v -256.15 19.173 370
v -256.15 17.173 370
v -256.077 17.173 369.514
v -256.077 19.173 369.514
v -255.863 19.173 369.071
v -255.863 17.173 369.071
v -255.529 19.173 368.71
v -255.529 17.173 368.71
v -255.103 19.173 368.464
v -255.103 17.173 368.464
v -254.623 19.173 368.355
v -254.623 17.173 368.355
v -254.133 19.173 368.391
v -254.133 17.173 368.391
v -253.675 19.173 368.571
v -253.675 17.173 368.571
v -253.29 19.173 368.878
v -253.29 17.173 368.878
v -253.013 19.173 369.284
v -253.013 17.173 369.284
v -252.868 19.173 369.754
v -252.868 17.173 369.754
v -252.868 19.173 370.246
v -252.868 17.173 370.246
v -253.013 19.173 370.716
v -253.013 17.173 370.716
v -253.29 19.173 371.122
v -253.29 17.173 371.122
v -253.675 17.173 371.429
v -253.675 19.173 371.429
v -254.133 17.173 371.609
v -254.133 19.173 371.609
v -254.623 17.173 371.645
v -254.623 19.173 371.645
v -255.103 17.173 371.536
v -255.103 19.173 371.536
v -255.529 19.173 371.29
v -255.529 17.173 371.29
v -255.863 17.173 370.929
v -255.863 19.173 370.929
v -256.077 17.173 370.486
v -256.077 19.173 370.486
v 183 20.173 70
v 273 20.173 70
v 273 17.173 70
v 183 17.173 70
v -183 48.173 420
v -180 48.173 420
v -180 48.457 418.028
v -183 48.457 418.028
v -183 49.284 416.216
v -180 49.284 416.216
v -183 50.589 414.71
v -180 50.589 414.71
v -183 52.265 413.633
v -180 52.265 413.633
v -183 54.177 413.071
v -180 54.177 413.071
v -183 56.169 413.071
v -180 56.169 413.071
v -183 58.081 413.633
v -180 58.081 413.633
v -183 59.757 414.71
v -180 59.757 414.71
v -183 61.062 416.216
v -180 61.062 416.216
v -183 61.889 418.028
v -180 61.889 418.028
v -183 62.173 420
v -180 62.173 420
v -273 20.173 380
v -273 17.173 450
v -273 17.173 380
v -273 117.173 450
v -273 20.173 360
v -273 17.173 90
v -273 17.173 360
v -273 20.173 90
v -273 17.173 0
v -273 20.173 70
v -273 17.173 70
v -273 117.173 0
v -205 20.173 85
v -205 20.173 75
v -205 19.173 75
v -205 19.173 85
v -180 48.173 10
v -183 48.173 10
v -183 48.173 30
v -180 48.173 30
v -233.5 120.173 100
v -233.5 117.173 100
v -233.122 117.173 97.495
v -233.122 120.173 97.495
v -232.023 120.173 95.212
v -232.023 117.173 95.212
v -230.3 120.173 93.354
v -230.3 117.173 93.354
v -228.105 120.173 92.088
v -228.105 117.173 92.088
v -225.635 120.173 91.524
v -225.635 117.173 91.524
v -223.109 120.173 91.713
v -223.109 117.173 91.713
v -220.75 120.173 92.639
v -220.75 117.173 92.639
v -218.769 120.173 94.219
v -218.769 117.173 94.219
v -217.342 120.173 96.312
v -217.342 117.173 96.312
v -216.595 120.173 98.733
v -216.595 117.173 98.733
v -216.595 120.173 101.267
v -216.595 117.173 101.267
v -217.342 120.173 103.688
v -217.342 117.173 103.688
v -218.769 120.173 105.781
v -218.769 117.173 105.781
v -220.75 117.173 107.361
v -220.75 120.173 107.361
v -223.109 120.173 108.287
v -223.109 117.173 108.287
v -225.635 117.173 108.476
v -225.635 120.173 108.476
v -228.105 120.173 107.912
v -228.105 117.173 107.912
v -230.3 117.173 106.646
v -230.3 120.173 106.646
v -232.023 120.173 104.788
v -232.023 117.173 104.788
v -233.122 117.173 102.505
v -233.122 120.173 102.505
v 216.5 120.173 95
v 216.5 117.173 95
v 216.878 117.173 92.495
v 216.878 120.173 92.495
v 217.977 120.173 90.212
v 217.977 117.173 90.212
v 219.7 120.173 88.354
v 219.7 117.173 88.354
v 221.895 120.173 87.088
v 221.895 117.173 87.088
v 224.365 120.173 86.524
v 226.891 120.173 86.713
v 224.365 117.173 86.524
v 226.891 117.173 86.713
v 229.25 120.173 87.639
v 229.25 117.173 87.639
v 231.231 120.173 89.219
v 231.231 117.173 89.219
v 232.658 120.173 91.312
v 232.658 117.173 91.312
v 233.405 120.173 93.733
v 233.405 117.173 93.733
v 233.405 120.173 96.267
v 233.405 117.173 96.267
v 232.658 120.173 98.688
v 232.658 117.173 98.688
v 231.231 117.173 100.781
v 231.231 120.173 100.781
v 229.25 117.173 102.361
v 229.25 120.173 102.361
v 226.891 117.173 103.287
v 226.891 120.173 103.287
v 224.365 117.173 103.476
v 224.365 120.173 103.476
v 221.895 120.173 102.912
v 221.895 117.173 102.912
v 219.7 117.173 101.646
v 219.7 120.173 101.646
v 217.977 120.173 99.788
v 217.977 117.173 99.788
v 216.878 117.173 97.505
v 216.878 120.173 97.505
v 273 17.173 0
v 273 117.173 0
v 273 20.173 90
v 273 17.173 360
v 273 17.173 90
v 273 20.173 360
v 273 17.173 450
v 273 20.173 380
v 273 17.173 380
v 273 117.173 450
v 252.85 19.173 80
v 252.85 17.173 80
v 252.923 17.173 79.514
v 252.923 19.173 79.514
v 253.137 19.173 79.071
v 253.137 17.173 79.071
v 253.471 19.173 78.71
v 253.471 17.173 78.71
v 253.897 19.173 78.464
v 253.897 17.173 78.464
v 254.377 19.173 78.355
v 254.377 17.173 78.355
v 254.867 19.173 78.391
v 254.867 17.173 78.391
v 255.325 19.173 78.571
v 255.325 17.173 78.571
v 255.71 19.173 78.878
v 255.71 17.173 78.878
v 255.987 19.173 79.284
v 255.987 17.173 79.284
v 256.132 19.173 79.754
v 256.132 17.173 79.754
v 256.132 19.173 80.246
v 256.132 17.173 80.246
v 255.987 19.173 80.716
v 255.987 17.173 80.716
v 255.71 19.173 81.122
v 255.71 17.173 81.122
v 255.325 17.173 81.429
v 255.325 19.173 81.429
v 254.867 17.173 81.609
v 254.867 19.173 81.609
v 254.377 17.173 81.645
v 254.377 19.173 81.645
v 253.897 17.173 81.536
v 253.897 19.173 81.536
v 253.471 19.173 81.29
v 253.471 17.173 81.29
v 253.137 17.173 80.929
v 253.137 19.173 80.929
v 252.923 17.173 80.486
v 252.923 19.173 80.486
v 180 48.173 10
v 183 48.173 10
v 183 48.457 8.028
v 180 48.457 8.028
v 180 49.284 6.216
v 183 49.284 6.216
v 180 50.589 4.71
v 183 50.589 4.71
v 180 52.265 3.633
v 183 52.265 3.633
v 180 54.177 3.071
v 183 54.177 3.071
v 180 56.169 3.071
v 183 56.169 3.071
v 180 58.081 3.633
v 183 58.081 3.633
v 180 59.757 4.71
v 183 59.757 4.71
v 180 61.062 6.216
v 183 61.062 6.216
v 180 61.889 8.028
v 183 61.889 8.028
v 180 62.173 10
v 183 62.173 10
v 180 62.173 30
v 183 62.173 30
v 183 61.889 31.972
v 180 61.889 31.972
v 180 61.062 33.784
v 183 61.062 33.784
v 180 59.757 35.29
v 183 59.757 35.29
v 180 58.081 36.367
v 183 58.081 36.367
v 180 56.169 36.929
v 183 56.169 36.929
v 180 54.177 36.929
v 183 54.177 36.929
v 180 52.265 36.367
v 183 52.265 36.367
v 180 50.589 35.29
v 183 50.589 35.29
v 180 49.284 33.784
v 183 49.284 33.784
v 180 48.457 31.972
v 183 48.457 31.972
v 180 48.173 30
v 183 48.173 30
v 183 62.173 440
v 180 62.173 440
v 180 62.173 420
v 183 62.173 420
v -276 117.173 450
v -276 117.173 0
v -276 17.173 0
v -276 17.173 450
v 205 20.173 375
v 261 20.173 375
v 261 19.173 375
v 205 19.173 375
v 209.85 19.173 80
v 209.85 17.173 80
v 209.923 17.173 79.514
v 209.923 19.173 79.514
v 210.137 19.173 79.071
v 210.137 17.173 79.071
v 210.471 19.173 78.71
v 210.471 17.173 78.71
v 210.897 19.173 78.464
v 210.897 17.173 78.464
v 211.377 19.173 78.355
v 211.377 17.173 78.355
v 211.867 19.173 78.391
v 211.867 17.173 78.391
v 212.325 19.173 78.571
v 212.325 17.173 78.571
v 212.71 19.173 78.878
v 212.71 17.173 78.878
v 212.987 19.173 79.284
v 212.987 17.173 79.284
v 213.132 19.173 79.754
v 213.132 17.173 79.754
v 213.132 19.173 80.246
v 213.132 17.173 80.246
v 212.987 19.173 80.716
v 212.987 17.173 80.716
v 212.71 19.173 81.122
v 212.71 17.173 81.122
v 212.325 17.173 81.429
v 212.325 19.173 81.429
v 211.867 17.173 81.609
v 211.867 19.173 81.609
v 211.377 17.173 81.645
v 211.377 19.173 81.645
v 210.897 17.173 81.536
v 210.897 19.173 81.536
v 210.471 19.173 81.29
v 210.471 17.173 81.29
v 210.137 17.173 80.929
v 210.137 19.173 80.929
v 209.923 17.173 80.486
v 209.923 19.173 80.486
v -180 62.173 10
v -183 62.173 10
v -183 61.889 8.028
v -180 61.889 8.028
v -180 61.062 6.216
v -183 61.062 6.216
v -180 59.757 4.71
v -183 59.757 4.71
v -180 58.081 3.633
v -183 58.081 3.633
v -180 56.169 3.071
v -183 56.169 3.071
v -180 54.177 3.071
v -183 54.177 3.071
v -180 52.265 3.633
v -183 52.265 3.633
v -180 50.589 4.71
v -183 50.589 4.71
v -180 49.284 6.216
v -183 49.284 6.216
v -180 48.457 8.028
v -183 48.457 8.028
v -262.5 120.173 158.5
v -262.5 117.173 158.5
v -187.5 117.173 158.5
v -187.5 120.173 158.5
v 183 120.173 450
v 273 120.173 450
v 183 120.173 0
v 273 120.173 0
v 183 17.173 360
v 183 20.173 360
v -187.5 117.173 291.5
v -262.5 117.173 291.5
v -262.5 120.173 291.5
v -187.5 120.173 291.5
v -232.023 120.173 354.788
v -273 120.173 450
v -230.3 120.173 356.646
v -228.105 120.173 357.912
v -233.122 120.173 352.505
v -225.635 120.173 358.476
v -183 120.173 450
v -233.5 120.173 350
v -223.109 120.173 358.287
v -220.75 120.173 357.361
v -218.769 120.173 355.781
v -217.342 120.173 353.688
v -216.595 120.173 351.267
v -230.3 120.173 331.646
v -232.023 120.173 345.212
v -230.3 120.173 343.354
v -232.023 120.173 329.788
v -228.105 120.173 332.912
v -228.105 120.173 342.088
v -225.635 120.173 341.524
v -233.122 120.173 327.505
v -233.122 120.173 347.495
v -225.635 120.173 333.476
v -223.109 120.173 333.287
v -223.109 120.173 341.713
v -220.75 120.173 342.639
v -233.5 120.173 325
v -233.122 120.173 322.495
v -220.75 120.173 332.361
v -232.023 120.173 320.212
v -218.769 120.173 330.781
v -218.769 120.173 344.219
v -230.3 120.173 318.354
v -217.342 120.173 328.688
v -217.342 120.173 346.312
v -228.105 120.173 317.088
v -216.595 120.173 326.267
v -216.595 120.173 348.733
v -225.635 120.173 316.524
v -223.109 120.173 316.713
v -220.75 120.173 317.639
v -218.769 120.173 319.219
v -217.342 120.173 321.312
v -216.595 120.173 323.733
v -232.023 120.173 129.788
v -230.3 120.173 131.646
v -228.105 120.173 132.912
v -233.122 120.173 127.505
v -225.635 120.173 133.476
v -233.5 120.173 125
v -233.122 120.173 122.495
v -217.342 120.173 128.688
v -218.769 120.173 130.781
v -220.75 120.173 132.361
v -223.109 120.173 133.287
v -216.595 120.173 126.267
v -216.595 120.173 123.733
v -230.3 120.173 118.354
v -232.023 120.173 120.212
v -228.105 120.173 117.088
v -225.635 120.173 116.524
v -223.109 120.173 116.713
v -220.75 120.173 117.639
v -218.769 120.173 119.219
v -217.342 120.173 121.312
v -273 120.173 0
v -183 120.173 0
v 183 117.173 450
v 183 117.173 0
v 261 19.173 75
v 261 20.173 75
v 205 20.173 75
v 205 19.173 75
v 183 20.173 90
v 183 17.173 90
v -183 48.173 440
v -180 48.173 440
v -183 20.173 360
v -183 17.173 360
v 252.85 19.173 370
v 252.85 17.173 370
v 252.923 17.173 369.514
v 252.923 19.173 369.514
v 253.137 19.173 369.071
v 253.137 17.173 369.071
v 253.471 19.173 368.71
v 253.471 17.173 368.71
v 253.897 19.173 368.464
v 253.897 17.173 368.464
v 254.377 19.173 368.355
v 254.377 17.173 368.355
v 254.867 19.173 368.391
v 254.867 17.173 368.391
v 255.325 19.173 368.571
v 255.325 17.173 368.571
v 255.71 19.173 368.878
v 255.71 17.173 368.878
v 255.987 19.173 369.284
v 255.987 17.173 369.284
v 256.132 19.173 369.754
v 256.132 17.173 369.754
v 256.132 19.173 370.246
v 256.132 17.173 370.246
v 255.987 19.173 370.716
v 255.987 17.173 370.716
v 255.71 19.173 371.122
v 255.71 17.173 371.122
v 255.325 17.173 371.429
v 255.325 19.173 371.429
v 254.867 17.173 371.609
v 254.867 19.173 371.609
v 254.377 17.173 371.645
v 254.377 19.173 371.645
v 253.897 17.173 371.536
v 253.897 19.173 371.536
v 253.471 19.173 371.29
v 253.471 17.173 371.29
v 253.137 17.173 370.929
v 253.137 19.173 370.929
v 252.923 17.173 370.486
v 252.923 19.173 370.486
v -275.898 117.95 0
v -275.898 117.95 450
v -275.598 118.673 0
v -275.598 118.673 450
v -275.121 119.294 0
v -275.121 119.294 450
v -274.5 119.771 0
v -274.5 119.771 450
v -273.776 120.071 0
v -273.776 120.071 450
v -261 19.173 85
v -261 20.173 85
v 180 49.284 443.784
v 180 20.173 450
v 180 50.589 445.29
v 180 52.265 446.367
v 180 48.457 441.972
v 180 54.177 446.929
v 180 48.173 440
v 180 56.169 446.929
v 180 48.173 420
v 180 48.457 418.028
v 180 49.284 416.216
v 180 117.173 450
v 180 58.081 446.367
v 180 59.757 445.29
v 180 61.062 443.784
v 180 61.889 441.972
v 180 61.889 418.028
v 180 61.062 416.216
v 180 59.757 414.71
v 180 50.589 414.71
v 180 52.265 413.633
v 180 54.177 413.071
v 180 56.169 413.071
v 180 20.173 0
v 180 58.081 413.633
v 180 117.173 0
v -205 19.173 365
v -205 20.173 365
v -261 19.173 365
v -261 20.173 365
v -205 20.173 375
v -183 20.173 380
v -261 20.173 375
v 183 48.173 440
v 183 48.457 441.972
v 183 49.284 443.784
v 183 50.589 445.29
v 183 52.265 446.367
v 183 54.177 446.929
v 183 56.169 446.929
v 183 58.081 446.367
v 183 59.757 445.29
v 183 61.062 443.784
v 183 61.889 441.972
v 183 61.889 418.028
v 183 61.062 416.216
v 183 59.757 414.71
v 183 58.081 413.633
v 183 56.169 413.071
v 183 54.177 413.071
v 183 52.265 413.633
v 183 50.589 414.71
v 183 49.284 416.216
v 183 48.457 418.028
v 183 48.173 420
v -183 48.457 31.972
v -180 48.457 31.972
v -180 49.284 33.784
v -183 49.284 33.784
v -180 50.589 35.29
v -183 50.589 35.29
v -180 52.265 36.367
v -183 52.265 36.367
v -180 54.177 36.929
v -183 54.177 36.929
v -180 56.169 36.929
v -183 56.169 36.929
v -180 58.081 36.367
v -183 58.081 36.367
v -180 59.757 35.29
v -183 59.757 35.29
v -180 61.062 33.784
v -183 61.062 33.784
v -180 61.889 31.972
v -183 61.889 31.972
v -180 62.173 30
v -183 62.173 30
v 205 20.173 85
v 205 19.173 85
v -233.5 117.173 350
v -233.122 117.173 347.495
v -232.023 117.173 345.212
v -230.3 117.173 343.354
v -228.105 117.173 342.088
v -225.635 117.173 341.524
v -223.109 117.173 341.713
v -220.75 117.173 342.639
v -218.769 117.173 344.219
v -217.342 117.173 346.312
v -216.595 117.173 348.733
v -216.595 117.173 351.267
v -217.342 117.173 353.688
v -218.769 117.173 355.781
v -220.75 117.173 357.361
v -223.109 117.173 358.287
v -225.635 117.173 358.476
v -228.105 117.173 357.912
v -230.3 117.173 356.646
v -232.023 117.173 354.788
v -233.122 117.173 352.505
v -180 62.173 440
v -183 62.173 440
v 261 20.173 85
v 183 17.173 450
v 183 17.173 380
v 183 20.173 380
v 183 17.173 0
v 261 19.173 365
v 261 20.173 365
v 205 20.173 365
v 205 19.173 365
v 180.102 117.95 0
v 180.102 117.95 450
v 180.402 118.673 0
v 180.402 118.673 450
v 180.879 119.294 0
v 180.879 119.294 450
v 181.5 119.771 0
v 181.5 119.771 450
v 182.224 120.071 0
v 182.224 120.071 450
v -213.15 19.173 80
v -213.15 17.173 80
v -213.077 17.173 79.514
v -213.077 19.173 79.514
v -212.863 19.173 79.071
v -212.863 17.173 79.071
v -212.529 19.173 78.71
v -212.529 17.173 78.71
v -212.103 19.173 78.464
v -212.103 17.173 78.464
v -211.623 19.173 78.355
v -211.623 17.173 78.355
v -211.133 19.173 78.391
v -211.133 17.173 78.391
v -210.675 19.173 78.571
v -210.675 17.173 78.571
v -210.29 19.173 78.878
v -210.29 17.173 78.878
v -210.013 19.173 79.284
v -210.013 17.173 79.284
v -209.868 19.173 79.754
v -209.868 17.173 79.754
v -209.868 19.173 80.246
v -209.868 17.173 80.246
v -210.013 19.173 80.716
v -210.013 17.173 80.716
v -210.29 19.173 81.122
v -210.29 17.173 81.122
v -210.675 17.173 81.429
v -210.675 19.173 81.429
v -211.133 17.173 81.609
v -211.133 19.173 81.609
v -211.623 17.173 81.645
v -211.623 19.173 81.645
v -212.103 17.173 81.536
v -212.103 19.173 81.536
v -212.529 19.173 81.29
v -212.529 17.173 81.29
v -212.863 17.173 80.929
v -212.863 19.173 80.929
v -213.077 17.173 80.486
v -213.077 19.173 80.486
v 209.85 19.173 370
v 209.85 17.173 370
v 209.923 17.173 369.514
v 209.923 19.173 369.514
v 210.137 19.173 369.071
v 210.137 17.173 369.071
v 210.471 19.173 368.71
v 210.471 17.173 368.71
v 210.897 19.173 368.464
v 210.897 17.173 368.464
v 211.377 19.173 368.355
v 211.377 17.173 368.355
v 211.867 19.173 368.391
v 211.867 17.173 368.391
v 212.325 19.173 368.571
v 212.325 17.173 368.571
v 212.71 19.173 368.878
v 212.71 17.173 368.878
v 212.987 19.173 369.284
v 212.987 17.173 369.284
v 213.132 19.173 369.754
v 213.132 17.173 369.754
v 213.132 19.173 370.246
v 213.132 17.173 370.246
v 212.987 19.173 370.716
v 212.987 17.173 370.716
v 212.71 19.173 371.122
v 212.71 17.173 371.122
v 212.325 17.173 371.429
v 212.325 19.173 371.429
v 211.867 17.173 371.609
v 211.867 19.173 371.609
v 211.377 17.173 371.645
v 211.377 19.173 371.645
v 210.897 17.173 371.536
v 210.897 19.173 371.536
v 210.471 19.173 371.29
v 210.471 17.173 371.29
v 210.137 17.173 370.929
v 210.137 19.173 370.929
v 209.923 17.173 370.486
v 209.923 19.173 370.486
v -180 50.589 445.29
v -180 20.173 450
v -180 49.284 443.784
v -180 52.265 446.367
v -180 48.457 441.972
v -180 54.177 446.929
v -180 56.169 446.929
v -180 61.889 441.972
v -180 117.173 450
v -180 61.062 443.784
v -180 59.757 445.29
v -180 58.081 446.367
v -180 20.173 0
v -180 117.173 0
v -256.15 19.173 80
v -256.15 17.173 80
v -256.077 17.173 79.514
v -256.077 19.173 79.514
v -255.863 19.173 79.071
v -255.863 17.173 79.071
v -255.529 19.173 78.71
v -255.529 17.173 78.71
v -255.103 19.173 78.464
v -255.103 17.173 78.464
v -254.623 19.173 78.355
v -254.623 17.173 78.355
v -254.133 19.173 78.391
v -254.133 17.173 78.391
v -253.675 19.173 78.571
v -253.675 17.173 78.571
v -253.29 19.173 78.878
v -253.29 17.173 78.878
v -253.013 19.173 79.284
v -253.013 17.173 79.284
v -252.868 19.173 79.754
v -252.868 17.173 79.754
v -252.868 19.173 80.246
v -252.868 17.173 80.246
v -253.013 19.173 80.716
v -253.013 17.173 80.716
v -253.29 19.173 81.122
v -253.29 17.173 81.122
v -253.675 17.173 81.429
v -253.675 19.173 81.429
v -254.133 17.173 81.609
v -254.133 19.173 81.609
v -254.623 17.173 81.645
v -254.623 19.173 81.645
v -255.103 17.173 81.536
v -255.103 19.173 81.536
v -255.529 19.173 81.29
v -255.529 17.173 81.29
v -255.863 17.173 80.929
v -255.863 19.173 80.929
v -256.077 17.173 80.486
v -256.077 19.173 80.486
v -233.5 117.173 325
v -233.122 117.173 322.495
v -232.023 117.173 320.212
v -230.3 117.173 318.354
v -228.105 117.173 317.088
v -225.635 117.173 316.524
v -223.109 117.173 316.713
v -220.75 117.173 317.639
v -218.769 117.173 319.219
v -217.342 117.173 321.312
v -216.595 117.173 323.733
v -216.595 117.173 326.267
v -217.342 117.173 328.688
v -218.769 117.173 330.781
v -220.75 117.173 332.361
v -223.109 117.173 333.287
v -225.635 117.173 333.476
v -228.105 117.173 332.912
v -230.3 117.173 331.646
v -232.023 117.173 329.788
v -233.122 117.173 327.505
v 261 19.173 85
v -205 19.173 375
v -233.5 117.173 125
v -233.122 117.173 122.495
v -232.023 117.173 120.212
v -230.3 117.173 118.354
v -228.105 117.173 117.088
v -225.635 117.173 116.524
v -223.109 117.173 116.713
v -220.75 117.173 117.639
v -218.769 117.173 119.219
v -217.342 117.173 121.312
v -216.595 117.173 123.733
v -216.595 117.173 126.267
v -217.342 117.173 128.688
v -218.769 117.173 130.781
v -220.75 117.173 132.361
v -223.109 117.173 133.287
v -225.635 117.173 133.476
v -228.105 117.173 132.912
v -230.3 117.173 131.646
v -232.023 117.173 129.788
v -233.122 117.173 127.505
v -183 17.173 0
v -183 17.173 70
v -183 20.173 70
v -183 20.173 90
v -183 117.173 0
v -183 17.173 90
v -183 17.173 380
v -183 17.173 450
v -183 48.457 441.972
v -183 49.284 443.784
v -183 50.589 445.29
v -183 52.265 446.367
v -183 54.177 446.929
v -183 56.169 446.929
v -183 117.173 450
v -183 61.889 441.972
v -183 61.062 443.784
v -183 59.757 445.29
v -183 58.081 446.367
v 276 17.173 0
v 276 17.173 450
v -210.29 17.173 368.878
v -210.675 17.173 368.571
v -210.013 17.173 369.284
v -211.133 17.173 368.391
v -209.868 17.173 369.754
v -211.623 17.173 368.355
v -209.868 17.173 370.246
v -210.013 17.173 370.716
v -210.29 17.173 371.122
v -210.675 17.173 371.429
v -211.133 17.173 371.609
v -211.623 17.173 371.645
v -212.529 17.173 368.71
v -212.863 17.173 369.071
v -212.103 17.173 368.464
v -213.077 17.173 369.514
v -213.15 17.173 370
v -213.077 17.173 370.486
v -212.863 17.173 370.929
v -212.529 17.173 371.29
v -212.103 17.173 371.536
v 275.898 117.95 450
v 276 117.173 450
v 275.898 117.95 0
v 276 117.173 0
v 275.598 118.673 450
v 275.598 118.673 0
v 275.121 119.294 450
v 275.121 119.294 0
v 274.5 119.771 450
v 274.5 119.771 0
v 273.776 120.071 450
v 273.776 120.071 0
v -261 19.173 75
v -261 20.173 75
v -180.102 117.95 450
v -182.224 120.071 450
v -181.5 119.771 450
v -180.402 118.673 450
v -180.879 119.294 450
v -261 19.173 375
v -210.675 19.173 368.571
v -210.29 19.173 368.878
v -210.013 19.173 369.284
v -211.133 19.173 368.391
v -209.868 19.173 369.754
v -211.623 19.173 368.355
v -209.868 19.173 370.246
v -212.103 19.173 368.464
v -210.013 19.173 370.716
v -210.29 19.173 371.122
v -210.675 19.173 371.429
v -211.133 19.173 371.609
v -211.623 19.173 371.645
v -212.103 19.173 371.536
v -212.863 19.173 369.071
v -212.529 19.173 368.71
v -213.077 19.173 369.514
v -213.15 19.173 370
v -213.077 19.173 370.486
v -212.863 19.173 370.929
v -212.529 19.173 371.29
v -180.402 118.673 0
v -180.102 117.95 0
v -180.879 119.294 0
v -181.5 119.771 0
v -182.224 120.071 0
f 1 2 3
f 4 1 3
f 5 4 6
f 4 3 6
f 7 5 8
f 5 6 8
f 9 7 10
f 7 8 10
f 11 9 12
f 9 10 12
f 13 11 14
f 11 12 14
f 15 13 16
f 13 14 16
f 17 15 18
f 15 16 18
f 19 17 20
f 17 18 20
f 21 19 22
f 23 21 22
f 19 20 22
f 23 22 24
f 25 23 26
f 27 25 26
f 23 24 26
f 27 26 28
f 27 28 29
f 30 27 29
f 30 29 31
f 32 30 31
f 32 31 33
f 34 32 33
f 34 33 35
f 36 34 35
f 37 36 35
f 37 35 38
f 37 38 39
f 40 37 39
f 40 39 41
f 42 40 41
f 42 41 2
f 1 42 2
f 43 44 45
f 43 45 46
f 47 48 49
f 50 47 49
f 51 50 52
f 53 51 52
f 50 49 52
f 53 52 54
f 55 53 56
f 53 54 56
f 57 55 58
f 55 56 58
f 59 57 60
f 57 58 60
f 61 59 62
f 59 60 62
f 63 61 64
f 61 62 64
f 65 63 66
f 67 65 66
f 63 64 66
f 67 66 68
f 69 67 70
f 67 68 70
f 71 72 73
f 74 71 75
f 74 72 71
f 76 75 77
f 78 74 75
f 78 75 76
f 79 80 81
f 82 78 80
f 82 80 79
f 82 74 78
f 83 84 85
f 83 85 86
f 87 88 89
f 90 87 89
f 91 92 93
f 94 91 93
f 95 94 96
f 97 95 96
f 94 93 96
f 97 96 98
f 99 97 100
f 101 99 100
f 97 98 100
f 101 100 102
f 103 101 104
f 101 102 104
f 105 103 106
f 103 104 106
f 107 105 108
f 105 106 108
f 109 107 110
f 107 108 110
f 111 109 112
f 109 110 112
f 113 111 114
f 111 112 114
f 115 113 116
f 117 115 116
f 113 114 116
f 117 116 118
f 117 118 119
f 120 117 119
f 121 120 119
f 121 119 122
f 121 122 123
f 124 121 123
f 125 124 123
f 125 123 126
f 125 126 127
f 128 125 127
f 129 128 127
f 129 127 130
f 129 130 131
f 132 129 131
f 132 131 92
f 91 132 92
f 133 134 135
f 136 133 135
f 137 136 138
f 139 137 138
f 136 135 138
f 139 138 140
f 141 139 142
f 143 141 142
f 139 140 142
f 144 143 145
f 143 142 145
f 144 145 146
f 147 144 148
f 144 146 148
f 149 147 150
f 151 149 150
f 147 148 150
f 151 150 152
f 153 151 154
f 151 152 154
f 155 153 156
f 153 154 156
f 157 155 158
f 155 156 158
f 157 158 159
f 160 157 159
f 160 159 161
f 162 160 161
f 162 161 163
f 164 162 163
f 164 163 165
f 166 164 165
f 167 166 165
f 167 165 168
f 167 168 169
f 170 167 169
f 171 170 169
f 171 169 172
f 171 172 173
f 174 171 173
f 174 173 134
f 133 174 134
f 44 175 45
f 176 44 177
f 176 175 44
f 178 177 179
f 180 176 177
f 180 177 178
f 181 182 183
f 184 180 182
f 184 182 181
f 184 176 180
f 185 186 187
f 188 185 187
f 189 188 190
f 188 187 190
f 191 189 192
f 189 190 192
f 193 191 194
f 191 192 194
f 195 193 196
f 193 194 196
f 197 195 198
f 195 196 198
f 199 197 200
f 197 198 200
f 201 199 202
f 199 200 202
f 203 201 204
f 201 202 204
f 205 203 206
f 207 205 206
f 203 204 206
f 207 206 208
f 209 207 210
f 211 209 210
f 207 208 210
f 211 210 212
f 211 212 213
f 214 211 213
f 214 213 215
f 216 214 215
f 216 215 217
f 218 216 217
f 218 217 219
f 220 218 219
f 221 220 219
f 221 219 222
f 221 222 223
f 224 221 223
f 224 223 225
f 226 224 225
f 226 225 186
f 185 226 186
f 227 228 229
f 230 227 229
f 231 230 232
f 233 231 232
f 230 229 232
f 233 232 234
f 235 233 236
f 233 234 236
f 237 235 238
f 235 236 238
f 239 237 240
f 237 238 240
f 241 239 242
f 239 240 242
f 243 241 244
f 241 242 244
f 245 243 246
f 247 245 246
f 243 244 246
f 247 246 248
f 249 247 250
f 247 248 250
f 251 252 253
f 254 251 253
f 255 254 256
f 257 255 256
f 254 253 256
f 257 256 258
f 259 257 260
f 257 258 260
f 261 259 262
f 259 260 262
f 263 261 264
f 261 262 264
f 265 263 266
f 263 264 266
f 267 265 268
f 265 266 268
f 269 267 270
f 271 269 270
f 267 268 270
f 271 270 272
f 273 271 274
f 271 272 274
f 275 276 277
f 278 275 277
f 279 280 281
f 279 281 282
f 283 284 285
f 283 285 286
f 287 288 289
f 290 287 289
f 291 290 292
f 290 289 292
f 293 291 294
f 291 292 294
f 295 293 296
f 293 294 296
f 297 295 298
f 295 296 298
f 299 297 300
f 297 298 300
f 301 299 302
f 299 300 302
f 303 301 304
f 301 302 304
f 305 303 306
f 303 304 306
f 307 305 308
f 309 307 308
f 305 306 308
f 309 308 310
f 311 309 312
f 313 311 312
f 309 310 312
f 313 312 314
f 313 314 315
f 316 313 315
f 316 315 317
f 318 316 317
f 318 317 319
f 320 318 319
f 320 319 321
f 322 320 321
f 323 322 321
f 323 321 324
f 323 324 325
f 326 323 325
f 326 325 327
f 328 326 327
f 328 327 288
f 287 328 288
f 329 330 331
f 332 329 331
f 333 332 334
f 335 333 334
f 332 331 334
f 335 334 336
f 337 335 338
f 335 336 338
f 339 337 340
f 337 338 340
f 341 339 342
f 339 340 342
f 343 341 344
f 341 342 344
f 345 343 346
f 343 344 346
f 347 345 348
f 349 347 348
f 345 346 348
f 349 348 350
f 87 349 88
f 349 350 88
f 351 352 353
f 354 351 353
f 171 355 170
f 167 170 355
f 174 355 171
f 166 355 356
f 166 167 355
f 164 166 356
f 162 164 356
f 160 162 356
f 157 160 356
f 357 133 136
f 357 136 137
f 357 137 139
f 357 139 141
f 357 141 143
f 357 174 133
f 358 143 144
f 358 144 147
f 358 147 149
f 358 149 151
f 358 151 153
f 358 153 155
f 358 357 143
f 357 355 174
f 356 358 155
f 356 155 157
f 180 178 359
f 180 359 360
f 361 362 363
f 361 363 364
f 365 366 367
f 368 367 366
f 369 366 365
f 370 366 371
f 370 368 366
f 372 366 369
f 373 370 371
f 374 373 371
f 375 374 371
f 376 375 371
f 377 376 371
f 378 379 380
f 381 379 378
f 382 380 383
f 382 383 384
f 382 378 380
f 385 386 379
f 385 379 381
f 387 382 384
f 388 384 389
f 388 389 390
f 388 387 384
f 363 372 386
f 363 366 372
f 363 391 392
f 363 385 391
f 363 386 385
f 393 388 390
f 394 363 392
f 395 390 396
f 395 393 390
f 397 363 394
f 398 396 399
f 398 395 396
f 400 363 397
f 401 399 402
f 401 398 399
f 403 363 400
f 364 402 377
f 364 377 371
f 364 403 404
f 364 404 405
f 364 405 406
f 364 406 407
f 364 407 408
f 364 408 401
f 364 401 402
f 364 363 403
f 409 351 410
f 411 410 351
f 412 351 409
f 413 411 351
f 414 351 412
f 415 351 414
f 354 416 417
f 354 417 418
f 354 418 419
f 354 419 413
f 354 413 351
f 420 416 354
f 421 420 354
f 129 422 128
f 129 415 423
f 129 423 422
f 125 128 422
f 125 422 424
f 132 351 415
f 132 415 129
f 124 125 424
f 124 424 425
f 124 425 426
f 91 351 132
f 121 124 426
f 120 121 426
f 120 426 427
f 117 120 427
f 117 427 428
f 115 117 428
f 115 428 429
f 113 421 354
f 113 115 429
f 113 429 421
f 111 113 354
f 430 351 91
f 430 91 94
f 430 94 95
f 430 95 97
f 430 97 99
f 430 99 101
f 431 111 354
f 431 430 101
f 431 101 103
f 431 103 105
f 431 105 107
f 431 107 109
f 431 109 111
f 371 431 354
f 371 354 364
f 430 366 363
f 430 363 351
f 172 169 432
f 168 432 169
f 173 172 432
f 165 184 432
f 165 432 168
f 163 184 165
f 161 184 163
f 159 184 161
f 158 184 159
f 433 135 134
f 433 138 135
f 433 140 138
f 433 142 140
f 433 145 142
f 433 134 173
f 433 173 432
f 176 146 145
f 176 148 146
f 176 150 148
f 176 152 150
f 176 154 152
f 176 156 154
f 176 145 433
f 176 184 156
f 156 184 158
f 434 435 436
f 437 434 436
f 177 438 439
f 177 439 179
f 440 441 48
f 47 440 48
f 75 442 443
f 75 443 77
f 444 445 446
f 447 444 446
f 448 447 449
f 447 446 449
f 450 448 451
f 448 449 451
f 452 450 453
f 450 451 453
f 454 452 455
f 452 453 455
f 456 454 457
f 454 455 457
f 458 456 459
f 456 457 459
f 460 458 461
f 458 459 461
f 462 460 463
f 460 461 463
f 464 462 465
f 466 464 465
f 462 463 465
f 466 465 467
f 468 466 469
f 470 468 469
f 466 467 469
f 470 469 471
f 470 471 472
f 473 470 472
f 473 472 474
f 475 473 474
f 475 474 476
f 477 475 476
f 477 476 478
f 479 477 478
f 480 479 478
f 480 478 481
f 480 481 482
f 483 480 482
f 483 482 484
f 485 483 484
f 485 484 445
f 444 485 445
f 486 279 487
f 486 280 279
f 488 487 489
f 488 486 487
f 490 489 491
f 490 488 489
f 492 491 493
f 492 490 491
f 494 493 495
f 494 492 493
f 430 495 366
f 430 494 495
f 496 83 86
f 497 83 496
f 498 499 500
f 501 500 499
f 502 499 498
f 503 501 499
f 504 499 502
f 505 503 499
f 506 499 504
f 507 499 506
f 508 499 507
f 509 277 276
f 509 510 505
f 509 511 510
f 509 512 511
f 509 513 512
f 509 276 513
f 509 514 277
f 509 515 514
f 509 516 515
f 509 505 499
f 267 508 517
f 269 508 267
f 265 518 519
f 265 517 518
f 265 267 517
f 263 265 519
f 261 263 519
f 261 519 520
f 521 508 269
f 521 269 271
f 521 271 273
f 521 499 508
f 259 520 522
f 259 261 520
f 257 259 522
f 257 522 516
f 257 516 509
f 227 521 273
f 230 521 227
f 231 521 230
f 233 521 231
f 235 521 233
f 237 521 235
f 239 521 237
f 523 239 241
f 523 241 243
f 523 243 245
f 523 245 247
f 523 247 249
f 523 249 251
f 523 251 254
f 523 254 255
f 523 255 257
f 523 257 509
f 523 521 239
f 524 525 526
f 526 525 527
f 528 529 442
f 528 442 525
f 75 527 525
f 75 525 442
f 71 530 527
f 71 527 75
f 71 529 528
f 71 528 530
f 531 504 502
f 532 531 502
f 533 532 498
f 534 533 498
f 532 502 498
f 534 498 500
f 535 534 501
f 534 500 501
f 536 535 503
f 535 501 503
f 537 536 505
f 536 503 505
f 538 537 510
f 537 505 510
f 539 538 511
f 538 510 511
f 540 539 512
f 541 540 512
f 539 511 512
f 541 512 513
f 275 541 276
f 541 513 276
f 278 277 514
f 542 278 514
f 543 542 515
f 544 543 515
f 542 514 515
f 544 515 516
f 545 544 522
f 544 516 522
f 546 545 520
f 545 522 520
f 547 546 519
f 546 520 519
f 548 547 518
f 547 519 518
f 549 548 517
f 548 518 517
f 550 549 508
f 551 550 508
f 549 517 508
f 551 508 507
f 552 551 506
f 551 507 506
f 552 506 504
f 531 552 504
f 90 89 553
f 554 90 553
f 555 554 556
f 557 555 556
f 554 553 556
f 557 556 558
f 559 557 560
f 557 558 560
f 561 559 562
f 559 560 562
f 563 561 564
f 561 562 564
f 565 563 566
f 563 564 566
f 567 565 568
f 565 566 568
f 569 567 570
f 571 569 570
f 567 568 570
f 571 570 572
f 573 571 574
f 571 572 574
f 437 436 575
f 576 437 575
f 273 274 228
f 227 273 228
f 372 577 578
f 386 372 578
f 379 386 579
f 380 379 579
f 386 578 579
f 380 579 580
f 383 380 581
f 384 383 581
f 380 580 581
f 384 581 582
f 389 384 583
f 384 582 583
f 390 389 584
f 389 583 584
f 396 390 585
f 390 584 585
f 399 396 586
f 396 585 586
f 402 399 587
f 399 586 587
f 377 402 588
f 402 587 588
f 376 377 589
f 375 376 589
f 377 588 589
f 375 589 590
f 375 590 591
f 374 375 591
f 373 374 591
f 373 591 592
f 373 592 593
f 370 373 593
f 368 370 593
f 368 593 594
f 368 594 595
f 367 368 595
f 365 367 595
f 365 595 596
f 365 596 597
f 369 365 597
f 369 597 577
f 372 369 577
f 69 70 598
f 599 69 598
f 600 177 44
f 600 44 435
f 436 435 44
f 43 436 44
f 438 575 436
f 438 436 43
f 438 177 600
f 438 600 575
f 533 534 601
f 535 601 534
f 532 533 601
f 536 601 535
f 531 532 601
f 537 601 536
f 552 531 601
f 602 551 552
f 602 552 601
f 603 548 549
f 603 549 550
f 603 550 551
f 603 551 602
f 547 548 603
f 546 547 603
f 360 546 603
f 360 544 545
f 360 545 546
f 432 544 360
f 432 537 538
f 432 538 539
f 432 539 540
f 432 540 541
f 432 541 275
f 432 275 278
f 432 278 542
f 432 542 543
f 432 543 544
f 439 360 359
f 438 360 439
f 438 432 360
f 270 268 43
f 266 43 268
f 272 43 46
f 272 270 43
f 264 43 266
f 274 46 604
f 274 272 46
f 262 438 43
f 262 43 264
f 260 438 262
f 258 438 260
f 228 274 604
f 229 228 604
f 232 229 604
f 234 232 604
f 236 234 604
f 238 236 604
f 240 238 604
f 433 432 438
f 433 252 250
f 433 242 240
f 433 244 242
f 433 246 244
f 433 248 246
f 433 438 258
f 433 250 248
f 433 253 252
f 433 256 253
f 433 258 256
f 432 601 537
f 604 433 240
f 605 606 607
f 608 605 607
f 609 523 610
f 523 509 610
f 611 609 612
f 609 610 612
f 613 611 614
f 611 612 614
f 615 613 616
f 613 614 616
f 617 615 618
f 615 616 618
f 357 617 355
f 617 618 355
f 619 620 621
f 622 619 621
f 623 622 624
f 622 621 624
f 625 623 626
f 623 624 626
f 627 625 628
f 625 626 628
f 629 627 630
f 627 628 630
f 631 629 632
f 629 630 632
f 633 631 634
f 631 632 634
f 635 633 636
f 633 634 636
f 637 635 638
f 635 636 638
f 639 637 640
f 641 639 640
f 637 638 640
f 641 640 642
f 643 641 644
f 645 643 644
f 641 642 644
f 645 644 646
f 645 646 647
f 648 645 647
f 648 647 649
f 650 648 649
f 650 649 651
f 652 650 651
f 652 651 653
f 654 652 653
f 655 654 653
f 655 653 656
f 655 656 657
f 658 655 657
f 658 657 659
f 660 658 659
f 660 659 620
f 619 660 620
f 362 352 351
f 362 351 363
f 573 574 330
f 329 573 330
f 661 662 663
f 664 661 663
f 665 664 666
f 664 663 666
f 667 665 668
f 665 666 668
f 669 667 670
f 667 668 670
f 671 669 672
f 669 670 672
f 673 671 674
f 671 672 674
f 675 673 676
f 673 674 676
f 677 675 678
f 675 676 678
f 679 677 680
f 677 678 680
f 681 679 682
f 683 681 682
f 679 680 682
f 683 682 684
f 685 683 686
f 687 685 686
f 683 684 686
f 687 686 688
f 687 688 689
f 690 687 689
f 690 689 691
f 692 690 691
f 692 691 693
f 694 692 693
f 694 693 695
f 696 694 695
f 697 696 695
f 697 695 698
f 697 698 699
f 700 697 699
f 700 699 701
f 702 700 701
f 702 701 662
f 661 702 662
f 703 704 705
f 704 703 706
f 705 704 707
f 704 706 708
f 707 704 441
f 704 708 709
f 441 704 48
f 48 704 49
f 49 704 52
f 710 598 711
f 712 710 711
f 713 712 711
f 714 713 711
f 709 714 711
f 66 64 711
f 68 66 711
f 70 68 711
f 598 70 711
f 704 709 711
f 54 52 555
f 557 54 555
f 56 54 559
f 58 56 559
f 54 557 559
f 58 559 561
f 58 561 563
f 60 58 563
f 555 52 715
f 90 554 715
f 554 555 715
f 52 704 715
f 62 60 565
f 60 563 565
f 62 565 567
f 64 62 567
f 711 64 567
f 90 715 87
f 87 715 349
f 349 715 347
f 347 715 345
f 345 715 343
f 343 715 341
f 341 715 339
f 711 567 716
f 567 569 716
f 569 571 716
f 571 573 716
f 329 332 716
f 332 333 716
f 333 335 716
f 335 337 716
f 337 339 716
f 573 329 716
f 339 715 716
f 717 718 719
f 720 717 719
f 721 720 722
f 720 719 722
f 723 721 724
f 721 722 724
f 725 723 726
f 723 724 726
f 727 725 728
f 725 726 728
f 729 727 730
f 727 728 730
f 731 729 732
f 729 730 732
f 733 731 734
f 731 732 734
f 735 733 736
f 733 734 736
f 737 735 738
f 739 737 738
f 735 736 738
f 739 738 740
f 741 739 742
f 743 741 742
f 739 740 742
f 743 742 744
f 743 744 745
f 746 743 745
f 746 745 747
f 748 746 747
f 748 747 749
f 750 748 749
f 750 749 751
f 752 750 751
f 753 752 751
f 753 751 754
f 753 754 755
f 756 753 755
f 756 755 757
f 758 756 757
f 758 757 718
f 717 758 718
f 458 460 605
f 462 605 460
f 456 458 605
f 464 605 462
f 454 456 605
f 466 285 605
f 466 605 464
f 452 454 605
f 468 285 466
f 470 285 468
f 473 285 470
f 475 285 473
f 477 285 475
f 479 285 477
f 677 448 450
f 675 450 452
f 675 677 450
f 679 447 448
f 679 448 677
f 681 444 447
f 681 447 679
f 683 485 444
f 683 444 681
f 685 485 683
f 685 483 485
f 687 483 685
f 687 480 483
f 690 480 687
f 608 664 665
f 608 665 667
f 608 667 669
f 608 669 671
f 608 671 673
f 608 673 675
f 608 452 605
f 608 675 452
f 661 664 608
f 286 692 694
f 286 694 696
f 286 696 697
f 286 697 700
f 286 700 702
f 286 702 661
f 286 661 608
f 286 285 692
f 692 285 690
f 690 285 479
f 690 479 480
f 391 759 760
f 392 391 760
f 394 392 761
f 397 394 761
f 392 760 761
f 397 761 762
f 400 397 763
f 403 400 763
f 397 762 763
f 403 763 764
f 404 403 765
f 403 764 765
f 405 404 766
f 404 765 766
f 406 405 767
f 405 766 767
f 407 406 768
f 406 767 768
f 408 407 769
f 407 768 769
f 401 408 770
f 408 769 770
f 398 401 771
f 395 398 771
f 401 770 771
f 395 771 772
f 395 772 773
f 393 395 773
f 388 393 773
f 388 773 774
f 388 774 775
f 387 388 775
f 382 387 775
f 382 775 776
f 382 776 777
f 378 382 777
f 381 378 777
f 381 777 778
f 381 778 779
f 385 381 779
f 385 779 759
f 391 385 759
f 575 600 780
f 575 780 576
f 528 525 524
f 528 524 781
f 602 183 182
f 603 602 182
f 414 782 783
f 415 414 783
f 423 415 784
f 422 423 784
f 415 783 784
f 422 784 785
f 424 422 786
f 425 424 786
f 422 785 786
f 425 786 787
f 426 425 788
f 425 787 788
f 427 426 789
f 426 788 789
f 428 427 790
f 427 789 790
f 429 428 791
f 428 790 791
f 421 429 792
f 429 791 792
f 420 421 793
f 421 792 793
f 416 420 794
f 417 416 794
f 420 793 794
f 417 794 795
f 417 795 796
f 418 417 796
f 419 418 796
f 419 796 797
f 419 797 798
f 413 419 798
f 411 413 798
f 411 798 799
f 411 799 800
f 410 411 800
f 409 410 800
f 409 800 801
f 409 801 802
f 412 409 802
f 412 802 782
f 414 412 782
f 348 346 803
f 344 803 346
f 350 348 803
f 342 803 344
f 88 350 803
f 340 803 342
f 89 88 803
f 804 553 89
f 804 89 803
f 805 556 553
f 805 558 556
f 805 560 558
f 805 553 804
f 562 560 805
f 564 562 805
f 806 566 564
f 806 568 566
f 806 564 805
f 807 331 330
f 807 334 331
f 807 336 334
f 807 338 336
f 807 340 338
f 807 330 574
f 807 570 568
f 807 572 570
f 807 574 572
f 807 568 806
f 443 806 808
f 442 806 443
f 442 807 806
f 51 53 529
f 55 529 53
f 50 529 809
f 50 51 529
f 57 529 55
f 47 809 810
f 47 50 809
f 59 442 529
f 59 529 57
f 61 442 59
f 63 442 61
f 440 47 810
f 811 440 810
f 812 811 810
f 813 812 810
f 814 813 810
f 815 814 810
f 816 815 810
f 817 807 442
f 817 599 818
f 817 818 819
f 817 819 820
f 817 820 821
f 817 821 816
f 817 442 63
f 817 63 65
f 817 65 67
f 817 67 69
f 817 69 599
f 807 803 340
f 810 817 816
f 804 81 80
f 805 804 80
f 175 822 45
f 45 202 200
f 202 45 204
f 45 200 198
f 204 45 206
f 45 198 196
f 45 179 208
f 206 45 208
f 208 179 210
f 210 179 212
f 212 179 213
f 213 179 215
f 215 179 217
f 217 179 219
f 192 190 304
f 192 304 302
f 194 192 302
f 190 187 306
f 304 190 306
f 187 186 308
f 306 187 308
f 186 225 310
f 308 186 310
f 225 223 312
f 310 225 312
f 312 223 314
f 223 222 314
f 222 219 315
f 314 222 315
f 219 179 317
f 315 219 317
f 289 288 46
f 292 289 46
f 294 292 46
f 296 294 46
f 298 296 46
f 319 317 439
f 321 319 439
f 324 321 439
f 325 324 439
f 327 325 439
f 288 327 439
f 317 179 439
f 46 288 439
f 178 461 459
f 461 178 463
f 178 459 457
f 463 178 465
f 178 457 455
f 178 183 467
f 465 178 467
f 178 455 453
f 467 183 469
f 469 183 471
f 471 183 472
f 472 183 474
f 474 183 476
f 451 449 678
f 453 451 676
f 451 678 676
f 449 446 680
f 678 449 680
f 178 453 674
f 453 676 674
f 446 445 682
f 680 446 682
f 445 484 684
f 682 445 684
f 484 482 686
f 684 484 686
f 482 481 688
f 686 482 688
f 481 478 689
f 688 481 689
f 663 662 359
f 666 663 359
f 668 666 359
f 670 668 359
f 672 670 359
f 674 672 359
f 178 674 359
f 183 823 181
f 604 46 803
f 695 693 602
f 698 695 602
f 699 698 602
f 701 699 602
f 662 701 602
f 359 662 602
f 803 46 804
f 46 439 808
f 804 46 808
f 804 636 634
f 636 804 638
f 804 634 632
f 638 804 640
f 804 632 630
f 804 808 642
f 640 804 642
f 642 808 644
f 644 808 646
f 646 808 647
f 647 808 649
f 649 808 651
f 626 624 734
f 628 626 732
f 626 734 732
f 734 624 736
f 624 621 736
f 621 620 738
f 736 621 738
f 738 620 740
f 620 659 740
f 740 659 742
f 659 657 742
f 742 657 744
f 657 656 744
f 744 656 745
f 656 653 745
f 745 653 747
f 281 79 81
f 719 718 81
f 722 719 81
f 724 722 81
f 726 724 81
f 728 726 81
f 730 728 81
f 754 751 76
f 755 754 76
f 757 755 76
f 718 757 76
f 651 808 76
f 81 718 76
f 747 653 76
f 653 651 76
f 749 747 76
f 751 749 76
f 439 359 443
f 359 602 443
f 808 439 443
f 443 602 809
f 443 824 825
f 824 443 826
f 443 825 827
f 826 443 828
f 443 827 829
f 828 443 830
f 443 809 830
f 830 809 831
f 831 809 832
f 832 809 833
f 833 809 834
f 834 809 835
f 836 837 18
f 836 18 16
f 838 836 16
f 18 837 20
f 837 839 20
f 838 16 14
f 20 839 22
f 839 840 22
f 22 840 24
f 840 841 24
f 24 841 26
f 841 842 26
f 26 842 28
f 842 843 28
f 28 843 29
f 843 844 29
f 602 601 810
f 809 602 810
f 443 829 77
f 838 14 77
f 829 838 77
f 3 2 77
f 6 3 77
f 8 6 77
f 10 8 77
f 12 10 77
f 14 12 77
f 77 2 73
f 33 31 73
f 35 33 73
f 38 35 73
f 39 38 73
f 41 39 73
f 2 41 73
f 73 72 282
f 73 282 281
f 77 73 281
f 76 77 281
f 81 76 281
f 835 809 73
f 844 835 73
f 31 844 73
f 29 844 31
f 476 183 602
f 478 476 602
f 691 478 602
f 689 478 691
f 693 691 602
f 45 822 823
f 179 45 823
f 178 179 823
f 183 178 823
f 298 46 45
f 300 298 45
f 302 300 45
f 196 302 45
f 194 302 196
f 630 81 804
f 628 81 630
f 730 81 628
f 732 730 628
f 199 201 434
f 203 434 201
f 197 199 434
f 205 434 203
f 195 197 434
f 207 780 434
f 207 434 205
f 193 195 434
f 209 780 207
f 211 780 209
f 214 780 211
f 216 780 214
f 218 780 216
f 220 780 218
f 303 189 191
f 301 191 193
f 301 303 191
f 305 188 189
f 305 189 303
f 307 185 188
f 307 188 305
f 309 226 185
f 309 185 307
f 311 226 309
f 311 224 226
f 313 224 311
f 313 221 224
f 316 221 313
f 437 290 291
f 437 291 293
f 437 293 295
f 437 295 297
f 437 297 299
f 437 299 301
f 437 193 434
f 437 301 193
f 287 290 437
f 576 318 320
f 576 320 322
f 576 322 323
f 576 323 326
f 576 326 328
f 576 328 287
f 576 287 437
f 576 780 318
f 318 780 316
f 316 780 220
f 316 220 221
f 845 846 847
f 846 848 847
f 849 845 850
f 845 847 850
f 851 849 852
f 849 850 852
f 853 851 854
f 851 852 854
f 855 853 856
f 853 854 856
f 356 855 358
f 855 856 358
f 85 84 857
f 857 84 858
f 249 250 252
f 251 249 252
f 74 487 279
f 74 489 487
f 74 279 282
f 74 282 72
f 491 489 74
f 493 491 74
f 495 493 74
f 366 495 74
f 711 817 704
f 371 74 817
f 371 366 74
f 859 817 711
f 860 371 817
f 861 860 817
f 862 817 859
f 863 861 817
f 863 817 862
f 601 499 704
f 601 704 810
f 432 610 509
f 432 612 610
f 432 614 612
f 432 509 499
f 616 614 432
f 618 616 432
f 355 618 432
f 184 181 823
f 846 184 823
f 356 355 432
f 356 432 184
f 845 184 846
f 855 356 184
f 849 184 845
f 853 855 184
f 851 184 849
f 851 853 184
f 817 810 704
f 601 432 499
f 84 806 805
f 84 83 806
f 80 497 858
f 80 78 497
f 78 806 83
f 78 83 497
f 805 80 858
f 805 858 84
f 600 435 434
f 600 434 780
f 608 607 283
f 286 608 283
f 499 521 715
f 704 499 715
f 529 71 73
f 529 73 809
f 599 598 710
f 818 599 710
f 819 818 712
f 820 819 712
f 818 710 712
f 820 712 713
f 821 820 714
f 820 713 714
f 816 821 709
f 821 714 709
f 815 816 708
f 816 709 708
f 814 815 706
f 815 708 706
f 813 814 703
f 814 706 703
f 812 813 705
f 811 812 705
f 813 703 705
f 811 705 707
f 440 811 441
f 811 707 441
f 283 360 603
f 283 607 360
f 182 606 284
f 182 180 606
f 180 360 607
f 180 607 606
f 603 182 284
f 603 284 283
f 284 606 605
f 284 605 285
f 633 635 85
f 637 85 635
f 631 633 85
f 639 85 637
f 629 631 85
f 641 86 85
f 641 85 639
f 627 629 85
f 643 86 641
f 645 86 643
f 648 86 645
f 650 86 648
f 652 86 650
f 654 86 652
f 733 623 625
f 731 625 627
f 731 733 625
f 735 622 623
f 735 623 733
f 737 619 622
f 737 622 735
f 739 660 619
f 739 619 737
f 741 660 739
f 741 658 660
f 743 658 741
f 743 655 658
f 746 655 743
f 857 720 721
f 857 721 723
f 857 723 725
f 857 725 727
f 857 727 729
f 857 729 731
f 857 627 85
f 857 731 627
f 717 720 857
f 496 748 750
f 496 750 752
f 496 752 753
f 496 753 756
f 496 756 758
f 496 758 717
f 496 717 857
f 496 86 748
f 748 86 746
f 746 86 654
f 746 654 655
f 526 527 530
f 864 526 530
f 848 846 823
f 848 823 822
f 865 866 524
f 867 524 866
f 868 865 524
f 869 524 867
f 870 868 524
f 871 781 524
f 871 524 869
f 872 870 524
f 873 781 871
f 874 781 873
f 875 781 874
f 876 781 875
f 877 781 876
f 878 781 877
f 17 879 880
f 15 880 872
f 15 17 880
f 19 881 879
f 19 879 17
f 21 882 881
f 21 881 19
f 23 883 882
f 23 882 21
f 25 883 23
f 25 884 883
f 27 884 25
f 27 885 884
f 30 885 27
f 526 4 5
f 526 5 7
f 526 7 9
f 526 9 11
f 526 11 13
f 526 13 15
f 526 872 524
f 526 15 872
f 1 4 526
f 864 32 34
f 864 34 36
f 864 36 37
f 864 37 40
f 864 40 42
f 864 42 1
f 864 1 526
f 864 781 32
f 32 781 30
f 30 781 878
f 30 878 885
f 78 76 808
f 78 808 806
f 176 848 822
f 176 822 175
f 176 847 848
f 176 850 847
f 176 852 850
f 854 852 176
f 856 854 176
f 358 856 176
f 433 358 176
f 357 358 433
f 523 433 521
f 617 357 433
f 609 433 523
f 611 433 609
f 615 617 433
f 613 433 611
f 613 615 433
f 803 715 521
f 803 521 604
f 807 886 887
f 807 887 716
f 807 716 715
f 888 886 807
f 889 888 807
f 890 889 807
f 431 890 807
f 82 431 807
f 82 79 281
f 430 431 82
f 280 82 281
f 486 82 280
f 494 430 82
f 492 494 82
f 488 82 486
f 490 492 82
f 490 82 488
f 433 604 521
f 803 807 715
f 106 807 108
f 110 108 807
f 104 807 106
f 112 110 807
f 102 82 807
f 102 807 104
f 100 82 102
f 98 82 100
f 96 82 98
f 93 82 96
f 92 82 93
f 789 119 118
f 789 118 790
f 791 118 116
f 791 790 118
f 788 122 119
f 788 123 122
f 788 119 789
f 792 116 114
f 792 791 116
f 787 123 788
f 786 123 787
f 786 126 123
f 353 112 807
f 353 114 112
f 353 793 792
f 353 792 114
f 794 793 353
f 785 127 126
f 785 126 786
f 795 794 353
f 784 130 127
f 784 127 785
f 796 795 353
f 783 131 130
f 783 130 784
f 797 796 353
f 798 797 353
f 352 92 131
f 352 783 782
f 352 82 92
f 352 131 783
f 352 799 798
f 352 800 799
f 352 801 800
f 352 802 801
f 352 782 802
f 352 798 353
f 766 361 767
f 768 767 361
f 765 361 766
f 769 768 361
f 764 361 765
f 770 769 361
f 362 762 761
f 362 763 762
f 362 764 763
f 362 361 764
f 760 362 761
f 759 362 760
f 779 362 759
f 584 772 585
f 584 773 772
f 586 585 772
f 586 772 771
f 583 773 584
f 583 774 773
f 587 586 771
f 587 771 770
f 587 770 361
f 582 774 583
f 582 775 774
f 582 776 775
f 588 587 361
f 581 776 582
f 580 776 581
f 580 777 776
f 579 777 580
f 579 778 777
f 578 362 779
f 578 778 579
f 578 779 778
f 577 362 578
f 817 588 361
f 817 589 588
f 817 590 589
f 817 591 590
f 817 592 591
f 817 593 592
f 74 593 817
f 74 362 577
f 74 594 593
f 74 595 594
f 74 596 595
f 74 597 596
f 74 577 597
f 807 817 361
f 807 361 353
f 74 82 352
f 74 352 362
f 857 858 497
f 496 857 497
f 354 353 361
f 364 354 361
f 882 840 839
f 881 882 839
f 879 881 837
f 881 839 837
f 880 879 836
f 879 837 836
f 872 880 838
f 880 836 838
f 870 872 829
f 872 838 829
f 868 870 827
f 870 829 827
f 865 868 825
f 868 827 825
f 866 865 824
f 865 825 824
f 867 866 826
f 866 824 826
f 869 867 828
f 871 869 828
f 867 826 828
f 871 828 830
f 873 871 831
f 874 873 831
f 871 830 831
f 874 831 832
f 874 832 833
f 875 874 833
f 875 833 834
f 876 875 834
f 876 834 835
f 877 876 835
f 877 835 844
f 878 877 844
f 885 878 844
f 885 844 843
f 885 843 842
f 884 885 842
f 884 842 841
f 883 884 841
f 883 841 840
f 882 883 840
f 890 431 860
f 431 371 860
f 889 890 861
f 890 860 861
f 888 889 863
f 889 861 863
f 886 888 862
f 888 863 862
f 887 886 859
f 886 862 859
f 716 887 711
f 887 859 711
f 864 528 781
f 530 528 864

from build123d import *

# Parameters (mm, degrees)
SKETCH1_W                      = 552
SKETCH1_H                      = 450
BOSS_EXTRUDE1_DEPTH            = 100
SKETCH2_W                      = 97
SKETCH2_H                      = 450
CUT_EXTRUDE1_DEPTH             = 90
SKETCH3_W                      = 450
SKETCH3_H                      = 97
CUT_EXTRUDE2_DEPTH             = 90
BOSS_EXTRUDE2_DEPTH            = 3
SKETCH5_W                      = 360
SKETCH5_H                      = 100
CUT_EXTRUDE3_DEPTH             = 542.403325206
SKETCH6_W                      = 20
SKETCH6_H                      = 3
BOSS_EXTRUDE3_DEPTH            = 90
SKETCH7_W                      = 20
SKETCH7_H                      = 3
BOSS_EXTRUDE4_DEPTH            = 90
CUT_EXTRUDE4_REACH             = 653.826
SKETCH9_W                      = 75
SKETCH9_H                      = 133
CUT_EXTRUDE5_DEPTH             = 538.285771261
CUT_EXTRUDE6_REACH             = 655.929
CUT_EXTRUDE7_REACH             = 653.826
CUT_EXTRUDE8_REACH             = 655.929
SKETCH13_W                     = 56
SKETCH13_H                     = 10
CUT_EXTRUDE9_DEPTH             = 1
SKETCH14_W                     = 56
SKETCH14_H                     = 10
CUT_EXTRUDE10_DEPTH            = 1
SKETCH15_W                     = 56
SKETCH15_H                     = 10
CUT_EXTRUDE11_DEPTH            = 1
SKETCH16_W                     = 56
SKETCH16_H                     = 10
CUT_EXTRUDE12_DEPTH            = 1
F_3_3_3_3_DIAMETER_HOLE1_D     = 3.3
F_3_3_3_3_DIAMETER_HOLE1_DEPTH = 2
F_17_0_17_DIAMETER_HOLE1_D     = 17
F_17_0_17_DIAMETER_HOLE1_DEPTH = 3
F_17_0_17_DIAMETER_HOLE2_D     = 17
F_17_0_17_DIAMETER_HOLE2_DEPTH = 103
FILLET1_R                      = 3


with BuildPart() as part:
    # Sketch1 → Boss-Extrude1 (new body)
    with BuildSketch(Plane(origin=(0, 120.173044165, 0), x_dir=(1, 0, 0), z_dir=(0, 1, 0))):
        with Locations((0, -225)):
            Rectangle(SKETCH1_W, SKETCH1_H)
    extrude(amount=-BOSS_EXTRUDE1_DEPTH)

    # Sketch2 → Cut-Extrude1 (cut)
    with BuildSketch(Plane(origin=(-273, 0, 0), x_dir=(0, -1, 0), z_dir=(-1, 0, 0))):
        with Locations((-68.673044165, 225)):
            Rectangle(SKETCH2_W, SKETCH2_H)
    extrude(amount=-CUT_EXTRUDE1_DEPTH, mode=Mode.SUBTRACT)

    # Sketch3 → Cut-Extrude2 (cut)
    with BuildSketch(Plane(origin=(273, 0, 0), x_dir=(0, 0, -1), z_dir=(1, 0, 0))):
        with Locations((-225, 68.673044165)):
            Rectangle(SKETCH3_W, SKETCH3_H)
    extrude(amount=-CUT_EXTRUDE2_DEPTH, mode=Mode.SUBTRACT)

    # Sketch4 → Boss-Extrude2 (add)
    with BuildSketch(Plane.XZ.offset(-20.173044165)):
        Polygon((-273, 360), (-273, 0), (-276, 0), (-276, 450), (-273, 450), (-273, 380), (-183, 380), (-183, 450), (183, 450), (183, 90), (273, 90), (273, 450), (276, 450), (276, 0), (273, 0), (273, 70), (183, 70), (183, 0), (-183, 0), (-183, 360), align=None)
    extrude(amount=BOSS_EXTRUDE2_DEPTH)

    # Sketch5 → Cut-Extrude3 (cut, through all)
    with BuildSketch(Plane(origin=(0, 0, 0), x_dir=(-1, 0, 0), z_dir=(0, 0, -1))):
        with Locations((0, 70.173044165)):
            Rectangle(SKETCH5_W, SKETCH5_H)
    extrude(amount=-CUT_EXTRUDE3_DEPTH, mode=Mode.SUBTRACT)

    # Sketch6 → Boss-Extrude3 (add)
    with BuildSketch(Plane(origin=(-273, 0, 0), x_dir=(0, 0, -1), z_dir=(1, 0, 0))):
        with Locations((-80, 18.673044165)):
            Rectangle(SKETCH6_W, SKETCH6_H)
    extrude(amount=BOSS_EXTRUDE3_DEPTH)

    # Sketch7 → Boss-Extrude4 (add)
    with BuildSketch(Plane.ZY.offset(-273)):
        with Locations((370, 18.673044165)):
            Rectangle(SKETCH7_W, SKETCH7_H)
    extrude(amount=BOSS_EXTRUDE4_DEPTH)

    # Sketch8 → Cut-Extrude4 (cut, up to next)
    with BuildSketch(Plane(origin=(-180, 0, 0), x_dir=(0, 0, -1), z_dir=(1, 0, 0)), mode=Mode.PRIVATE) as cut_extrude4_sk1:
        with BuildLine():
            Line((-440, 48.173044165), (-420, 48.173044165))
            ThreePointArc((-420, 48.173044165), (-413, 55.173044165), (-420, 62.173044165))
            Line((-420, 62.173044165), (-440, 62.173044165))
            ThreePointArc((-440, 62.173044165), (-447, 55.173044165), (-440, 48.173044165))
        make_face()
    cut_extrude4_tool1 = extrude(cut_extrude4_sk1.sketch, amount=-CUT_EXTRUDE4_REACH, mode=Mode.PRIVATE) & part.part
    add(cut_extrude4_tool1.solids().sort_by_distance((-180, 55.173044, 430))[0], mode=Mode.SUBTRACT)

    # Sketch9 → Cut-Extrude5 (cut, through all)
    with BuildSketch(Plane.XZ.offset(-117.173044165)):
        with Locations((-225, 225)):
            Rectangle(SKETCH9_W, SKETCH9_H)
    extrude(amount=-CUT_EXTRUDE5_DEPTH, mode=Mode.SUBTRACT)

    # Sketch10 → Cut-Extrude6 (cut, up to next)
    with BuildSketch(Plane.ZY.offset(183), mode=Mode.PRIVATE) as cut_extrude6_sk1:
        with BuildLine():
            Line((10, 48.173044165), (30, 48.173044165))
            ThreePointArc((30, 48.173044165), (37, 55.173044165), (30, 62.173044165))
            Line((30, 62.173044165), (10, 62.173044165))
            ThreePointArc((10, 62.173044165), (3, 55.173044165), (10, 48.173044165))
        make_face()
    cut_extrude6_tool1 = extrude(cut_extrude6_sk1.sketch, amount=-CUT_EXTRUDE6_REACH, mode=Mode.PRIVATE) & part.part
    add(cut_extrude6_tool1.solids().sort_by_distance((-183, 55.173044, 20))[0], mode=Mode.SUBTRACT)

    # Sketch11 → Cut-Extrude7 (cut, up to next)
    with BuildSketch(Plane.ZY.offset(-180), mode=Mode.PRIVATE) as cut_extrude7_sk1:
        with BuildLine():
            Line((440, 62.173044165), (420, 62.173044165))
            ThreePointArc((420, 62.173044165), (413, 55.173044165), (420, 48.173044165))
            Line((420, 48.173044165), (440, 48.173044165))
            ThreePointArc((440, 48.173044165), (447, 55.173044165), (440, 62.173044165))
        make_face()
    cut_extrude7_tool1 = extrude(cut_extrude7_sk1.sketch, amount=-CUT_EXTRUDE7_REACH, mode=Mode.PRIVATE) & part.part
    add(cut_extrude7_tool1.solids().sort_by_distance((180, 55.173044, 430))[0], mode=Mode.SUBTRACT)

    # Sketch12 → Cut-Extrude8 (cut, up to next)
    with BuildSketch(Plane(origin=(183, 0, 0), x_dir=(0, 0, -1), z_dir=(1, 0, 0)), mode=Mode.PRIVATE) as cut_extrude8_sk1:
        with BuildLine():
            Line((-10, 62.173044165), (-30, 62.173044165))
            ThreePointArc((-30, 62.173044165), (-37, 55.173044165), (-30, 48.173044165))
            Line((-30, 48.173044165), (-10, 48.173044165))
            ThreePointArc((-10, 48.173044165), (-3, 55.173044165), (-10, 62.173044165))
        make_face()
    cut_extrude8_tool1 = extrude(cut_extrude8_sk1.sketch, amount=-CUT_EXTRUDE8_REACH, mode=Mode.PRIVATE) & part.part
    add(cut_extrude8_tool1.solids().sort_by_distance((183, 55.173044, 20))[0], mode=Mode.SUBTRACT)

    # Sketch13 → Cut-Extrude9 (cut)
    with BuildSketch(Plane(origin=(0, 20.173044165, 0), x_dir=(-1, 0, 0), z_dir=(0, 1, 0))):
        with Locations((233, 80)):
            Rectangle(SKETCH13_W, SKETCH13_H)
    extrude(amount=-CUT_EXTRUDE9_DEPTH, mode=Mode.SUBTRACT)

    # Sketch14 → Cut-Extrude10 (cut)
    with BuildSketch(Plane(origin=(0, 20.173044165, 0), x_dir=(-1, 0, 0), z_dir=(0, 1, 0))):
        with Locations((233, 370)):
            Rectangle(SKETCH14_W, SKETCH14_H)
    extrude(amount=-CUT_EXTRUDE10_DEPTH, mode=Mode.SUBTRACT)

    # Sketch15 → Cut-Extrude11 (cut)
    with BuildSketch(Plane(origin=(0, 20.173044165, 0), x_dir=(-1, 0, 0), z_dir=(0, 1, 0))):
        with Locations((-233, 370)):
            Rectangle(SKETCH15_W, SKETCH15_H)
    extrude(amount=-CUT_EXTRUDE11_DEPTH, mode=Mode.SUBTRACT)

    # Sketch16 → Cut-Extrude12 (cut)
    with BuildSketch(Plane(origin=(0, 20.173044165, 0), x_dir=(-1, 0, 0), z_dir=(0, 1, 0))):
        with Locations((-233, 80)):
            Rectangle(SKETCH16_W, SKETCH16_H)
    extrude(amount=-CUT_EXTRUDE12_DEPTH, mode=Mode.SUBTRACT)

    # Ø3.3 (3.3) Diameter Hole1
    with Locations(Plane(origin=(0, 19.173044165, 0), x_dir=(1, 0, 0), z_dir=(0, 1, 0))):
        with Locations((-254.5, -80), (-211.5, -80), (-254.5, -370), (-211.5, -370), (211.5, -370), (254.5, -370), (211.5, -80), (254.5, -80)):
            Hole(F_3_3_3_3_DIAMETER_HOLE1_D / 2, depth=F_3_3_3_3_DIAMETER_HOLE1_DEPTH)

    # Ø17.0 (17) Diameter Hole1
    with Locations(Plane(origin=(0, 120.173044165, 0), x_dir=(1, 0, 0), z_dir=(0, 1, 0))):
        with Locations((225, -95)):
            Hole(F_17_0_17_DIAMETER_HOLE1_D / 2, depth=F_17_0_17_DIAMETER_HOLE1_DEPTH)

    # Ø17.0 (17) Diameter Hole2
    with Locations(Plane(origin=(0, 120.173044165, 0), x_dir=(1, 0, 0), z_dir=(0, 1, 0))):
        with Locations((-225, -100), (-225, -125), (-225, -325), (-225, -350)):
            Hole(F_17_0_17_DIAMETER_HOLE2_D / 2, depth=F_17_0_17_DIAMETER_HOLE2_DEPTH)

    # Fillet1
    fillet1_edges = [part.edges().sort_by_distance(p)[0] for p in [
        (-180, 120.173044165, 225),
        (180, 120.173044165, 225),
        (276, 120.173044165, 225),
        (-276, 120.173044165, 225),
    ]]
    fillet(fillet1_edges, radius=FILLET1_R)


solid = part.part
